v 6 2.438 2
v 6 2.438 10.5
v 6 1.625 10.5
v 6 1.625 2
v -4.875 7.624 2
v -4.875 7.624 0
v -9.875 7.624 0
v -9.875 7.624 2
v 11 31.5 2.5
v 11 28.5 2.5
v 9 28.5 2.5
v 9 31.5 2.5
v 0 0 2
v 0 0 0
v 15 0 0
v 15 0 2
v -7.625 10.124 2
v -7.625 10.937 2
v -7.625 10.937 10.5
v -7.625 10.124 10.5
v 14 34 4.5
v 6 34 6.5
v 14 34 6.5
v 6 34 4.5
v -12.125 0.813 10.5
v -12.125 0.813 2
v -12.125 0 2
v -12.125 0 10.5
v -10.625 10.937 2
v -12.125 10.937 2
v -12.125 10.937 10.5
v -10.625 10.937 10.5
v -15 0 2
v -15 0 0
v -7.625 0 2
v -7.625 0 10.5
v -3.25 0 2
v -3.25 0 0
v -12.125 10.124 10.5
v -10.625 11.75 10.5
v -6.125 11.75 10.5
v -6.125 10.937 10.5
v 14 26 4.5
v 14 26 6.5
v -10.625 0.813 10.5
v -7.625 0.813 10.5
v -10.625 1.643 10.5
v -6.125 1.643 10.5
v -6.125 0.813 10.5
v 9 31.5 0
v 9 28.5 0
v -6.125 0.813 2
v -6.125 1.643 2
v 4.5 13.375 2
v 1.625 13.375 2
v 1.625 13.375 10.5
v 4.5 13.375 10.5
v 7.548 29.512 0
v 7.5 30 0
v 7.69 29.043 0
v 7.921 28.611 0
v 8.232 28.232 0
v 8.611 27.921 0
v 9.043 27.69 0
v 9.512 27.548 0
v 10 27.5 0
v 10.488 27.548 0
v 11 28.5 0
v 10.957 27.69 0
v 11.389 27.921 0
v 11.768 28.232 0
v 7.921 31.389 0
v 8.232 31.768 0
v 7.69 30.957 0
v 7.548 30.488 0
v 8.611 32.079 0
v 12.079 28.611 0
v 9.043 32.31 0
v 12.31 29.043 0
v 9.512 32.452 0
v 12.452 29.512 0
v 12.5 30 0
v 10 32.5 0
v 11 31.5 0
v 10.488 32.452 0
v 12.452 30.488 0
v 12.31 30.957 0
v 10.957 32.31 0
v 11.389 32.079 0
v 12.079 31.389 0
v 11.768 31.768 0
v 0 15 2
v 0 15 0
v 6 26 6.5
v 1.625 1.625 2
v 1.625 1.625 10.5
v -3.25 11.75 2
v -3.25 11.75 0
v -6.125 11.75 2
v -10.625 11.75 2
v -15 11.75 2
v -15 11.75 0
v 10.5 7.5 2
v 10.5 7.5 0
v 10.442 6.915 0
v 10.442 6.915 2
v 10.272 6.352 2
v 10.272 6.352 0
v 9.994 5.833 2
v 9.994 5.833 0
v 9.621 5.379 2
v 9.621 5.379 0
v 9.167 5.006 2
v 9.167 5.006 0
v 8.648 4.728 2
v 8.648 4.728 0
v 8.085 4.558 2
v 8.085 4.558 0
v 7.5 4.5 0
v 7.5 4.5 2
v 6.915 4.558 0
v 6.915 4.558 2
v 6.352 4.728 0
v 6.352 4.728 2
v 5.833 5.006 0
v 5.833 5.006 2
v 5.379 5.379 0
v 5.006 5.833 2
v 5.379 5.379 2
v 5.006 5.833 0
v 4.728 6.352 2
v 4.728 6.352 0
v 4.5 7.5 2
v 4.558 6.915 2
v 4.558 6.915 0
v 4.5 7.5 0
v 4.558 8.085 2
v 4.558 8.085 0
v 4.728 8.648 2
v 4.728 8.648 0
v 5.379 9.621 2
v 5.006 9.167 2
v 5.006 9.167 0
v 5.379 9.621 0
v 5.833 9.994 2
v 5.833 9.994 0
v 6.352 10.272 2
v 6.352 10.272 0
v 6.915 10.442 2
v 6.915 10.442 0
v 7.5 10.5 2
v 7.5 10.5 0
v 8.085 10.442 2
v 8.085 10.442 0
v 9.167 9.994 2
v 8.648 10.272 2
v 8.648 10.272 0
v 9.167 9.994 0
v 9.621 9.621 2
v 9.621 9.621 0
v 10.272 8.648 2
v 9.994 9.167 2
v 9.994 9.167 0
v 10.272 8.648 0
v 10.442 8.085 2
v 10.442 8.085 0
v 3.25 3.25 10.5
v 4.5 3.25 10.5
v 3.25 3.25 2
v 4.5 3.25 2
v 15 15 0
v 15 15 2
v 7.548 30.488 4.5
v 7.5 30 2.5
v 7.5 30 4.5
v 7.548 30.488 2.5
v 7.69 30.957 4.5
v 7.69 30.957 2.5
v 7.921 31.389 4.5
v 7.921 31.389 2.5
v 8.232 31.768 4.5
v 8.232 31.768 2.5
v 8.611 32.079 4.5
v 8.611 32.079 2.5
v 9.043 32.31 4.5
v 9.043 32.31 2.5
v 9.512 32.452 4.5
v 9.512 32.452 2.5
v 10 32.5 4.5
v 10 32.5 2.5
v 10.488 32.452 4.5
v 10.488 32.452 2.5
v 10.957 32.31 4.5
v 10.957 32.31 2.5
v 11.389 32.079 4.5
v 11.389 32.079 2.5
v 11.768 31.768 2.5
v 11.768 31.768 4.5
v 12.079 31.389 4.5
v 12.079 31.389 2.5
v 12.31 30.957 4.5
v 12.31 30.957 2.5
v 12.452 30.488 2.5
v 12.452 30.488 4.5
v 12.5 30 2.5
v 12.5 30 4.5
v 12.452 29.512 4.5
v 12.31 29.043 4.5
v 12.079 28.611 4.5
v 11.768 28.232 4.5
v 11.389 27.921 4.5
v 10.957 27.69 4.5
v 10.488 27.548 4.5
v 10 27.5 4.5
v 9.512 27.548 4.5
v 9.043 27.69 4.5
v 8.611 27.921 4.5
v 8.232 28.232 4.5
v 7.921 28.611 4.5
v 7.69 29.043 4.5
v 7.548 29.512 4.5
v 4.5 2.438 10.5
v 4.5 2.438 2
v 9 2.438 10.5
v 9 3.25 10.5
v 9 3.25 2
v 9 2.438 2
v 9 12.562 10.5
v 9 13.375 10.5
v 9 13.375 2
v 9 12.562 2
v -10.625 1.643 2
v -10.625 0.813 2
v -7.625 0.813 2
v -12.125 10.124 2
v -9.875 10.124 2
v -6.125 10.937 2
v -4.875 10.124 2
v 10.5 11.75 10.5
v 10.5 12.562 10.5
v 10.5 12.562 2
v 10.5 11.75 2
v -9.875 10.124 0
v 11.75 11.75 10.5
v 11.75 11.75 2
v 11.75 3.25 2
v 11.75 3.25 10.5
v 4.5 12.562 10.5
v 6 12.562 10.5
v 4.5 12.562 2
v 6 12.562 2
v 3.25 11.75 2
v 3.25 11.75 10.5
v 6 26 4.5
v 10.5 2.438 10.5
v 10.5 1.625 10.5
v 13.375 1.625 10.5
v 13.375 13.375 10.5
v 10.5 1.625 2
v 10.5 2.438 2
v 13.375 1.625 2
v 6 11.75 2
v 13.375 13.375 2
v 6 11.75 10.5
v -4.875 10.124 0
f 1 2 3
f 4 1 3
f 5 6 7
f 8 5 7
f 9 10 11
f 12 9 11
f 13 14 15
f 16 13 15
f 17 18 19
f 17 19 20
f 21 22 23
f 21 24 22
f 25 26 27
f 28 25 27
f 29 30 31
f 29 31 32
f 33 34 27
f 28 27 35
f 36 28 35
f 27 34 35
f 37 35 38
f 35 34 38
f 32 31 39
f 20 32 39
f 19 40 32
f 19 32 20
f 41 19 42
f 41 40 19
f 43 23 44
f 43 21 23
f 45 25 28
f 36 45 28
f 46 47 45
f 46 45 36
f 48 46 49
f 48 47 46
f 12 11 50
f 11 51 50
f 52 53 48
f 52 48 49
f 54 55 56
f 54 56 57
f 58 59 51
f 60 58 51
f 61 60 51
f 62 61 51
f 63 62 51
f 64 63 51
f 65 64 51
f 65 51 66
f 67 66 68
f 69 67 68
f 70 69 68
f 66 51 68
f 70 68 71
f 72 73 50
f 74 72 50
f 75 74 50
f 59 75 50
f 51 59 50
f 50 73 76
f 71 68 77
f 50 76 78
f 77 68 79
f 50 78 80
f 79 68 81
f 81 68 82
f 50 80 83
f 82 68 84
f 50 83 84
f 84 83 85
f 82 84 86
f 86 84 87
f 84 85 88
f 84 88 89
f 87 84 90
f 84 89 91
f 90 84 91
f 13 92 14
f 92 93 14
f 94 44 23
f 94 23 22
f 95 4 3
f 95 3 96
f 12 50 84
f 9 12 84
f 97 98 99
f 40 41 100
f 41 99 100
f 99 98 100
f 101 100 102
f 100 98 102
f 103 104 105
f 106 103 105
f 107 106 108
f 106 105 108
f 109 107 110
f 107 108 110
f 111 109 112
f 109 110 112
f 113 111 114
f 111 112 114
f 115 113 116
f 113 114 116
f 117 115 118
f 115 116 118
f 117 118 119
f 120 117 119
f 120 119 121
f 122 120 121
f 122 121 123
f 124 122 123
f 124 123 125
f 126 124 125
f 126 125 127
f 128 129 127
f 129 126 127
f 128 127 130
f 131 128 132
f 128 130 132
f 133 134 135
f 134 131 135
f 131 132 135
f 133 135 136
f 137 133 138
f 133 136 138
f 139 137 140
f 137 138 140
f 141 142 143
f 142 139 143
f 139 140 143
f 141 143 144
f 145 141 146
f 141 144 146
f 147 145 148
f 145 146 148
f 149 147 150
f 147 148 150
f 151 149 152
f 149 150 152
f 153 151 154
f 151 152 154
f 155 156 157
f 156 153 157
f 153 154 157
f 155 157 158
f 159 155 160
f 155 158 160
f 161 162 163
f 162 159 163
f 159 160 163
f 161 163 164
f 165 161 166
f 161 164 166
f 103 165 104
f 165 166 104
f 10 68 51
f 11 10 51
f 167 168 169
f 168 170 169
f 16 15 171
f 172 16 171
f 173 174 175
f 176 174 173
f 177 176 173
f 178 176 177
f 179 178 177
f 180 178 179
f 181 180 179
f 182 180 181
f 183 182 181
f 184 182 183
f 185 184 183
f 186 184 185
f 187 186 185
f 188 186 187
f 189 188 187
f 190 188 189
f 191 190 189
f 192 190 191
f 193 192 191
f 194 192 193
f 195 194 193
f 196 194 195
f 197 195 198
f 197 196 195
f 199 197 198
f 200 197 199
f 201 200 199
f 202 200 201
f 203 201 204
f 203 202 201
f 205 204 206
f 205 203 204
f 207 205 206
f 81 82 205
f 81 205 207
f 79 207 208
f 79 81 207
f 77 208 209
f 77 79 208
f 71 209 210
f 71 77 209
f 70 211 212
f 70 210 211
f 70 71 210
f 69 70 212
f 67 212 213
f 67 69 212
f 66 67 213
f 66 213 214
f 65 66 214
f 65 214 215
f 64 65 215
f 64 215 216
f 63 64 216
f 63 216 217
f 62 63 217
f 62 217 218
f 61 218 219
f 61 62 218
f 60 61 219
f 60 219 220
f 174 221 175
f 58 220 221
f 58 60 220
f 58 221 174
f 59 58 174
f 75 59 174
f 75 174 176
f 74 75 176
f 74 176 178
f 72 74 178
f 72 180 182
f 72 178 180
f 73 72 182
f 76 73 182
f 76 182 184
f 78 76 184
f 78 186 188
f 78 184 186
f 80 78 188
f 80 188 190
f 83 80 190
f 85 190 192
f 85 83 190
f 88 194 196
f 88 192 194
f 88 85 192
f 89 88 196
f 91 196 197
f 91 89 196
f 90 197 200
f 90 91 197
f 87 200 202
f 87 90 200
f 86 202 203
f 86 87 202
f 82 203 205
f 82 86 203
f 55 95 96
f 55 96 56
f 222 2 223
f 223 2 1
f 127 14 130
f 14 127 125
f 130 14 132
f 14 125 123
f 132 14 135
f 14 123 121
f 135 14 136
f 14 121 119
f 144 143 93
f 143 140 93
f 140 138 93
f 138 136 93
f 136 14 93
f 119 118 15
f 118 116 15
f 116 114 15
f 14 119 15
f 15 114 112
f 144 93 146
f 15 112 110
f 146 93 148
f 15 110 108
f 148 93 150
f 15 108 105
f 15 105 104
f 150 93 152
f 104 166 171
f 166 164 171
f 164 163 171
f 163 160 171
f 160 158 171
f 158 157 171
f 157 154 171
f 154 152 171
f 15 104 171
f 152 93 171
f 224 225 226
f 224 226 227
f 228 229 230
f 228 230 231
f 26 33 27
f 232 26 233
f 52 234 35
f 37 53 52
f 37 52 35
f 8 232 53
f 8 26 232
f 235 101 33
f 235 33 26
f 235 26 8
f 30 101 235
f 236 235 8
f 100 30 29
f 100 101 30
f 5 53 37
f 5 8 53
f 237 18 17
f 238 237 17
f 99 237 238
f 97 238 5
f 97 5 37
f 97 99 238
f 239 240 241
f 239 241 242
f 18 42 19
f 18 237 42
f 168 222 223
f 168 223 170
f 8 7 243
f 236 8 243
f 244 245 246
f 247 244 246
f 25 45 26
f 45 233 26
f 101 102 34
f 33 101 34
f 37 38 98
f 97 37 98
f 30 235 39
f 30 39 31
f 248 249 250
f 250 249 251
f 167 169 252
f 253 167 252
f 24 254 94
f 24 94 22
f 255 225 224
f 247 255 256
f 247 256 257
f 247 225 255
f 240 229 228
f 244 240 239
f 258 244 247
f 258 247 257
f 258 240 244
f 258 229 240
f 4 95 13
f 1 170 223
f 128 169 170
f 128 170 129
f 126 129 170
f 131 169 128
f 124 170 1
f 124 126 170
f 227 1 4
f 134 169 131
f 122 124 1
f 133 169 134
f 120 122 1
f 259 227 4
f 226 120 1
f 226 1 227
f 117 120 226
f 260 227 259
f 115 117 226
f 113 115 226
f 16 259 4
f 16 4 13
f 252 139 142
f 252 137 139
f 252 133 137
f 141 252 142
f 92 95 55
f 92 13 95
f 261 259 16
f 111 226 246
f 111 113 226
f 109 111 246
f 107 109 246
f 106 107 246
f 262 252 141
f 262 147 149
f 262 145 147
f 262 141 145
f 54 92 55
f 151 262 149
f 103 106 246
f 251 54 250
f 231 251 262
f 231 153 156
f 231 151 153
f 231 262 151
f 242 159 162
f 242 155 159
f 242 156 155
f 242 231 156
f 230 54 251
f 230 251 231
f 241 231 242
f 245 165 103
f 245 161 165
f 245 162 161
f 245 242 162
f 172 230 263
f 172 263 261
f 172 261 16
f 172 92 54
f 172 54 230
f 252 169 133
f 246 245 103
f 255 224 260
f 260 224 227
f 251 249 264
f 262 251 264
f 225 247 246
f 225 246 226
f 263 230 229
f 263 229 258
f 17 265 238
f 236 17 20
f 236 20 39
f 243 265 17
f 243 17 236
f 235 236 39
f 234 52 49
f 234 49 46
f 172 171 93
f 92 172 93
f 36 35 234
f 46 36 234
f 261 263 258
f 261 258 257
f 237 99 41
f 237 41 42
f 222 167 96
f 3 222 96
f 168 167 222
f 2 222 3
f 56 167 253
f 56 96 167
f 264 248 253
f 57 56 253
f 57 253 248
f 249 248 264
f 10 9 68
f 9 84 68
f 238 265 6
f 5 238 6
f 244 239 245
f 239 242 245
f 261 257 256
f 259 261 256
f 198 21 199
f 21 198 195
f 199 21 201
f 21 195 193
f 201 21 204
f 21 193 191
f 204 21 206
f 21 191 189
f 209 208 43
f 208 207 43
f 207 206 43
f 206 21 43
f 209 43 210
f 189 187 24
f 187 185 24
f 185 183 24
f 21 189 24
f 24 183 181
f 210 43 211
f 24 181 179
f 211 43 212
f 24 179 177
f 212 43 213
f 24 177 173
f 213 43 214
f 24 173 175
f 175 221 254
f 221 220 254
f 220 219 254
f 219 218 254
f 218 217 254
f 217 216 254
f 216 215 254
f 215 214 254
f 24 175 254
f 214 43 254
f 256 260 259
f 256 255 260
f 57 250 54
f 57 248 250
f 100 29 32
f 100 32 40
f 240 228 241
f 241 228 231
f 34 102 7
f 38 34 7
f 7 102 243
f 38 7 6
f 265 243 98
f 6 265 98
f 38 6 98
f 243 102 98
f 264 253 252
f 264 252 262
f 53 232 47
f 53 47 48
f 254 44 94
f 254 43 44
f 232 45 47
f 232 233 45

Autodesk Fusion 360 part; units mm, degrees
sketch "Sketch1" plane through (0, 0, 0) normal (0, 0, 1) x (1, 0, 0)
  line L0 (0, 0) -> (15, 0)
  line L1 (15, 0) -> (15, 15)
  line L2 (15, 15) -> (0, 15)
  line L3 (0, 15) -> (0, 0)
  line L4 (3.25, 11.75) -> (11.75, 11.75)
  line L5 (11.75, 11.75) -> (11.75, 3.25)
  line L6 (11.75, 3.25) -> (3.25, 3.25)
  line L7 (3.25, 3.25) -> (3.25, 11.75)
  line L8 (1.625, 13.375) -> (13.375, 13.375)
  line L9 (13.375, 13.375) -> (13.375, 1.625)
  line L10 (13.375, 1.625) -> (1.625, 1.625)
  line L11 (1.625, 1.625) -> (1.625, 13.375)
  circle A0 centre (7.5, 7.5) radius 3
  dimension "d1" = 15
  dimension "d2" = 15
  dimension "d3" = 8.5
  dimension "d4" = 8.5
  dimension "d5" = 3.25
  dimension "d6" = 3.25
  dimension "d7" = 1.625
  dimension "d8" = 1.625
  dimension "d9" = 1.625
  dimension "d10" = 1.625
  dimension "d15" = 6
  dimension "d16" = 4.25
  dimension "d17" = 4.25
extrude "Extrude1" add sketch "Sketch1" along normal blind 2 contours L0 L1 L2 L3 | L4 L5 L6 L7 | A0 makes body 1 at (6.0833, 8.9167, 0) makes body 2 at (5.5417, 0.5417, 0)
extrude "Extrude2" add sketch "Sketch1" along normal blind 10.5 contours L8 L9 L10 L11 bodies 1 2
extrude "Extrude3" cut sketch "Sketch1" along normal blind 2 contours A0 bodies 1
sketch "Sketch2" plane through (0, 0, 10.5) normal (0, 0, 1) x (-1, 0, 0)
  line L0 (-11.75, -3.25) -> (-3.25, -3.25)
  line L1 (-3.25, -3.25) -> (-3.25, -11.75)
  line L2 (-3.25, -11.75) -> (-11.75, -11.75)
  line L3 (-11.75, -11.75) -> (-11.75, -3.25)
  line L4 (-1.625, -1.625) -> (-13.375, -1.625)
  line L5 (-13.375, -1.625) -> (-13.375, -13.375)
  line L6 (-13.375, -13.375) -> (-1.625, -13.375)
  line L7 (-1.625, -13.375) -> (-1.625, -1.625)
  line L8 (-7.5, -13.375) -> (-9, -13.375)
  line L9 (-9, -13.375) -> (-9, -11.75)
  line L10 (-9, -11.75) -> (-7.5, -11.75)
  line L11 (-7.5, -11.75) -> (-7.5, -13.375)
  line L12 (-7.5, -13.375) -> (-6, -13.375)
  line L13 (-6, -13.375) -> (-6, -11.75)
  line L14 (-6, -11.75) -> (-7.5, -11.75)
  line L15 (-7.5, -11.75) -> (-7.5, -13.375)
  line L16 (-7.5, -3.25) -> (-9, -3.25)
  line L17 (-9, -3.25) -> (-9, -1.625)
  line L18 (-9, -1.625) -> (-7.5, -1.625)
  line L19 (-7.5, -1.625) -> (-7.5, -3.25)
  line L20 (-7.5, -3.25) -> (-6, -3.25)
  line L21 (-6, -3.25) -> (-6, -1.625)
  line L22 (-6, -1.625) -> (-7.5, -1.625)
  line L23 (-7.5, -1.625) -> (-7.5, -3.25)
  dimension "d20" = 1.5
  dimension "d21" = 1.5
extrude "Extrude4" cut sketch "Sketch2" against normal blind 8.5 contours L0 L4 L16 L17 L18 L19 L23 | L0 L4 L19 L20 L21 L22 L23 | L2 L6 L8 L9 L10 L11 L15 | L2 L6 L11 L12 L13 L14 L15 bodies 1
sketch "Sketch3" plane through (6, 0, 0) normal (1, 0, 0) x (0, 1, 0)
  line L0 (3.25, 10.5) -> (1.625, 10.5)
  line L1 (1.625, 10.5) -> (1.625, 2)
  line L2 (1.625, 2) -> (3.25, 2)
  line L3 (3.25, 2) -> (3.25, 10.5)
  line L4 (3.25, 10.5) -> (2.4375, 10.5)
  line L5 (2.4375, 10.5) -> (2.4375, 2)
  line L6 (2.4375, 2) -> (3.25, 2)
  line L7 (3.25, 2) -> (3.25, 10.5)
  line L8 (13.375, 10.5) -> (12.562, 10.5)
  line L9 (12.562, 10.5) -> (12.562, 2)
  line L10 (12.562, 2) -> (13.375, 2)
  line L11 (13.375, 2) -> (13.375, 10.5)
  dimension "d24" = 0.8125
  dimension "d25" = 8.5
  dimension "d26" = 0.813
  dimension "d27" = 8.5
extrude "Extrude5" cut sketch "Sketch3" against normal blind 1.5 contours L0 L2 L3 L4 L5 L6 L7 | L8 L9 L10 L11 bodies 1
sketch "Sketch4" plane through (9, 0, 0) normal (-1, 0, 0) x (0, -1, 0)
  line L0 (-11.75, 10.5) -> (-13.375, 10.5)
  line L1 (-13.375, 10.5) -> (-13.375, 2)
  line L2 (-13.375, 2) -> (-11.75, 2)
  line L3 (-11.75, 2) -> (-11.75, 10.5)
  line L4 (-11.75, 10.5) -> (-12.5625, 10.5)
  line L5 (-12.5625, 10.5) -> (-12.5625, 2)
  line L6 (-12.5625, 2) -> (-11.75, 2)
  line L7 (-11.75, 2) -> (-11.75, 10.5)
  line L8 (-1.625, 10.5) -> (-2.438, 10.5)
  line L9 (-2.438, 10.5) -> (-2.438, 2)
  line L10 (-2.438, 2) -> (-1.625, 2)
  line L11 (-1.625, 2) -> (-1.625, 10.5)
  dimension "d30" = 8.5
  dimension "d31" = 0.813
  dimension "d32" = 8.5
extrude "Extrude6" cut sketch "Sketch4" against normal blind 1.5 contours L0 L2 L3 L4 L5 L6 L7 | L8 L9 L10 L11 bodies 1
sketch "Sketch5" plane through (0, 0, 0) normal (0, 0, 1) x (1, 0, 0)
  line L0 (-15, 0) -> (-3.25, 0)
  line L1 (-3.25, 0) -> (-3.25, 11.75)
  line L2 (-3.25, 11.75) -> (-15, 11.75)
  line L3 (-15, 11.75) -> (-15, 0)
  line L4 (-10.625, 11.75) -> (-6.125, 11.75)
  line L5 (-6.125, 11.75) -> (-6.125, 10.937)
  line L6 (-6.125, 10.937) -> (-10.625, 10.937)
  line L7 (-10.625, 10.937) -> (-10.625, 11.75)
  line L8 (-12.125, 10.937) -> (-7.625, 10.937)
  line L9 (-7.625, 10.937) -> (-7.625, 10.124)
  line L10 (-7.625, 10.124) -> (-12.125, 10.124)
  line L11 (-12.125, 10.124) -> (-12.125, 10.937)
  line L12 (-12.125, 0) -> (-7.625, 0)
  line L13 (-7.625, 0) -> (-7.625, 0.813)
  line L14 (-7.625, 0.813) -> (-12.125, 0.813)
  line L15 (-12.125, 0.813) -> (-12.125, 0)
  line L16 (-6.125, 0.813) -> (-10.625, 0.813)
  line L17 (-10.625, 0.813) -> (-10.625, 1.643)
  line L18 (-10.625, 1.643) -> (-6.125, 1.643)
  line L19 (-6.125, 1.643) -> (-6.125, 0.813)
  line L20 (-9.875, 10.124) -> (-4.875, 10.124)
  line L21 (-4.875, 10.124) -> (-4.875, 7.624)
  line L22 (-4.875, 7.624) -> (-9.875, 7.624)
  line L23 (-9.875, 7.624) -> (-9.875, 10.124)
  dimension "d35" = 11.75
  dimension "d36" = 11.75
  dimension "d38" = 2.875
  dimension "d39" = 0.813
  dimension "d40" = 4.5
  dimension "d41" = 0.813
  dimension "d42" = 4.375
  dimension "d43" = 4.5
  dimension "d44" = 0.813
  dimension "d45" = 4.375
  dimension "d46" = 4.5
  dimension "d47" = 0.83
  dimension "d48" = 2.875
  dimension "d49" = 5
  dimension "d50" = 2.5
  dimension "d51" = 1.625
  dimension "d52" = 4.5
extrude "Extrude7" add sketch "Sketch5" along normal blind 10.5 separate body contours L0 L12 L13 L14 L15 L16 | L2 L4 L5 L6 L7 L8 | L14 L16 L17 L18 L19 | L6 L8 L9 L10 L11 L20 makes body 3 at (-9.125, 10.124, 3.5) makes body 4 at (-9.125, 1.643, 3.5)
extrude "Extrude8" add sketch "Sketch5" along normal blind 2 contours L0 L1 L2 L3 L5 L6 L7 L8 L9 L10 L11 L13 L14 L15 L16 L17 L18 L19 L20 L21 L22 L23 bodies 3 4
sketch "Sketch6" plane through (0, 0, 0) normal (0, 0, 1) x (1, 0, 0)
  circle A0 centre (10, 30) radius 2.5
  line L0 (9, 31.5) -> (11, 31.5)
  line L1 (11, 31.5) -> (11, 28.5)
  line L2 (11, 28.5) -> (9, 28.5)
  line L3 (9, 28.5) -> (9, 31.5)
  dimension "d57" = 5
  dimension "d58" = 2
  dimension "d59" = 3
  dimension "d60" = 1
  dimension "d61" = 1.5
extrude "Extrude9" add sketch "Sketch6" along normal blind 2.5 separate body makes body 5
sketch "Sketch7" plane through (0, 0, 2.5) normal (0, 0, 1) x (-1, 0, 0)
  line L0 (-11, -28.5) -> (-9, -28.5)
  line L1 (-9, -28.5) -> (-9, -31.5)
  line L2 (-9, -31.5) -> (-11, -31.5)
  line L3 (-11, -31.5) -> (-11, -28.5)
  circle A0 centre (-10, -30) radius 2.5
  circle A1 centre (-10, -30) radius 2.5
extrude "Extrude10" add sketch "Sketch7" along normal blind 2 contours L0 L1 L2 L3 | A0 A1 bodies 5
sketch "Sketch8" plane through (0, 0, 4.5) normal (0, 0, 1) x (-1, 0, 0)
  circle A0 centre (-10, -30) radius 2.5
  line L0 (-10, -30) -> (-14, -30)
  line L1 (-14, -30) -> (-14, -26)
  line L2 (-14, -26) -> (-10, -26)
  line L3 (-10, -26) -> (-10, -30)
  line L4 (-10, -30) -> (-6, -30)
  line L5 (-6, -30) -> (-6, -34)
  line L6 (-6, -34) -> (-10, -34)
  line L7 (-10, -34) -> (-10, -30)
  line L8 (-6, -34) -> (-14, -34)
  line L9 (-14, -34) -> (-14, -26)
  line L10 (-14, -26) -> (-6, -26)
  line L11 (-6, -26) -> (-6, -34)
  dimension "d66" = 4
  dimension "d67" = 4
  dimension "d68" = 4
  dimension "d69" = 4
extrude "Extrude11" add sketch "Sketch8" along normal blind 2 bodies 5
equation "d7 = ( 3.25 / 2 ) * 1 mm"
equation "d8 = ( 3.25 / 2 ) * 1 mm"
equation "d16 = ( 8.5 / 2 ) * 1 mm"
equation "d24 = ( 1.625 / 2 ) * 1 mm"
